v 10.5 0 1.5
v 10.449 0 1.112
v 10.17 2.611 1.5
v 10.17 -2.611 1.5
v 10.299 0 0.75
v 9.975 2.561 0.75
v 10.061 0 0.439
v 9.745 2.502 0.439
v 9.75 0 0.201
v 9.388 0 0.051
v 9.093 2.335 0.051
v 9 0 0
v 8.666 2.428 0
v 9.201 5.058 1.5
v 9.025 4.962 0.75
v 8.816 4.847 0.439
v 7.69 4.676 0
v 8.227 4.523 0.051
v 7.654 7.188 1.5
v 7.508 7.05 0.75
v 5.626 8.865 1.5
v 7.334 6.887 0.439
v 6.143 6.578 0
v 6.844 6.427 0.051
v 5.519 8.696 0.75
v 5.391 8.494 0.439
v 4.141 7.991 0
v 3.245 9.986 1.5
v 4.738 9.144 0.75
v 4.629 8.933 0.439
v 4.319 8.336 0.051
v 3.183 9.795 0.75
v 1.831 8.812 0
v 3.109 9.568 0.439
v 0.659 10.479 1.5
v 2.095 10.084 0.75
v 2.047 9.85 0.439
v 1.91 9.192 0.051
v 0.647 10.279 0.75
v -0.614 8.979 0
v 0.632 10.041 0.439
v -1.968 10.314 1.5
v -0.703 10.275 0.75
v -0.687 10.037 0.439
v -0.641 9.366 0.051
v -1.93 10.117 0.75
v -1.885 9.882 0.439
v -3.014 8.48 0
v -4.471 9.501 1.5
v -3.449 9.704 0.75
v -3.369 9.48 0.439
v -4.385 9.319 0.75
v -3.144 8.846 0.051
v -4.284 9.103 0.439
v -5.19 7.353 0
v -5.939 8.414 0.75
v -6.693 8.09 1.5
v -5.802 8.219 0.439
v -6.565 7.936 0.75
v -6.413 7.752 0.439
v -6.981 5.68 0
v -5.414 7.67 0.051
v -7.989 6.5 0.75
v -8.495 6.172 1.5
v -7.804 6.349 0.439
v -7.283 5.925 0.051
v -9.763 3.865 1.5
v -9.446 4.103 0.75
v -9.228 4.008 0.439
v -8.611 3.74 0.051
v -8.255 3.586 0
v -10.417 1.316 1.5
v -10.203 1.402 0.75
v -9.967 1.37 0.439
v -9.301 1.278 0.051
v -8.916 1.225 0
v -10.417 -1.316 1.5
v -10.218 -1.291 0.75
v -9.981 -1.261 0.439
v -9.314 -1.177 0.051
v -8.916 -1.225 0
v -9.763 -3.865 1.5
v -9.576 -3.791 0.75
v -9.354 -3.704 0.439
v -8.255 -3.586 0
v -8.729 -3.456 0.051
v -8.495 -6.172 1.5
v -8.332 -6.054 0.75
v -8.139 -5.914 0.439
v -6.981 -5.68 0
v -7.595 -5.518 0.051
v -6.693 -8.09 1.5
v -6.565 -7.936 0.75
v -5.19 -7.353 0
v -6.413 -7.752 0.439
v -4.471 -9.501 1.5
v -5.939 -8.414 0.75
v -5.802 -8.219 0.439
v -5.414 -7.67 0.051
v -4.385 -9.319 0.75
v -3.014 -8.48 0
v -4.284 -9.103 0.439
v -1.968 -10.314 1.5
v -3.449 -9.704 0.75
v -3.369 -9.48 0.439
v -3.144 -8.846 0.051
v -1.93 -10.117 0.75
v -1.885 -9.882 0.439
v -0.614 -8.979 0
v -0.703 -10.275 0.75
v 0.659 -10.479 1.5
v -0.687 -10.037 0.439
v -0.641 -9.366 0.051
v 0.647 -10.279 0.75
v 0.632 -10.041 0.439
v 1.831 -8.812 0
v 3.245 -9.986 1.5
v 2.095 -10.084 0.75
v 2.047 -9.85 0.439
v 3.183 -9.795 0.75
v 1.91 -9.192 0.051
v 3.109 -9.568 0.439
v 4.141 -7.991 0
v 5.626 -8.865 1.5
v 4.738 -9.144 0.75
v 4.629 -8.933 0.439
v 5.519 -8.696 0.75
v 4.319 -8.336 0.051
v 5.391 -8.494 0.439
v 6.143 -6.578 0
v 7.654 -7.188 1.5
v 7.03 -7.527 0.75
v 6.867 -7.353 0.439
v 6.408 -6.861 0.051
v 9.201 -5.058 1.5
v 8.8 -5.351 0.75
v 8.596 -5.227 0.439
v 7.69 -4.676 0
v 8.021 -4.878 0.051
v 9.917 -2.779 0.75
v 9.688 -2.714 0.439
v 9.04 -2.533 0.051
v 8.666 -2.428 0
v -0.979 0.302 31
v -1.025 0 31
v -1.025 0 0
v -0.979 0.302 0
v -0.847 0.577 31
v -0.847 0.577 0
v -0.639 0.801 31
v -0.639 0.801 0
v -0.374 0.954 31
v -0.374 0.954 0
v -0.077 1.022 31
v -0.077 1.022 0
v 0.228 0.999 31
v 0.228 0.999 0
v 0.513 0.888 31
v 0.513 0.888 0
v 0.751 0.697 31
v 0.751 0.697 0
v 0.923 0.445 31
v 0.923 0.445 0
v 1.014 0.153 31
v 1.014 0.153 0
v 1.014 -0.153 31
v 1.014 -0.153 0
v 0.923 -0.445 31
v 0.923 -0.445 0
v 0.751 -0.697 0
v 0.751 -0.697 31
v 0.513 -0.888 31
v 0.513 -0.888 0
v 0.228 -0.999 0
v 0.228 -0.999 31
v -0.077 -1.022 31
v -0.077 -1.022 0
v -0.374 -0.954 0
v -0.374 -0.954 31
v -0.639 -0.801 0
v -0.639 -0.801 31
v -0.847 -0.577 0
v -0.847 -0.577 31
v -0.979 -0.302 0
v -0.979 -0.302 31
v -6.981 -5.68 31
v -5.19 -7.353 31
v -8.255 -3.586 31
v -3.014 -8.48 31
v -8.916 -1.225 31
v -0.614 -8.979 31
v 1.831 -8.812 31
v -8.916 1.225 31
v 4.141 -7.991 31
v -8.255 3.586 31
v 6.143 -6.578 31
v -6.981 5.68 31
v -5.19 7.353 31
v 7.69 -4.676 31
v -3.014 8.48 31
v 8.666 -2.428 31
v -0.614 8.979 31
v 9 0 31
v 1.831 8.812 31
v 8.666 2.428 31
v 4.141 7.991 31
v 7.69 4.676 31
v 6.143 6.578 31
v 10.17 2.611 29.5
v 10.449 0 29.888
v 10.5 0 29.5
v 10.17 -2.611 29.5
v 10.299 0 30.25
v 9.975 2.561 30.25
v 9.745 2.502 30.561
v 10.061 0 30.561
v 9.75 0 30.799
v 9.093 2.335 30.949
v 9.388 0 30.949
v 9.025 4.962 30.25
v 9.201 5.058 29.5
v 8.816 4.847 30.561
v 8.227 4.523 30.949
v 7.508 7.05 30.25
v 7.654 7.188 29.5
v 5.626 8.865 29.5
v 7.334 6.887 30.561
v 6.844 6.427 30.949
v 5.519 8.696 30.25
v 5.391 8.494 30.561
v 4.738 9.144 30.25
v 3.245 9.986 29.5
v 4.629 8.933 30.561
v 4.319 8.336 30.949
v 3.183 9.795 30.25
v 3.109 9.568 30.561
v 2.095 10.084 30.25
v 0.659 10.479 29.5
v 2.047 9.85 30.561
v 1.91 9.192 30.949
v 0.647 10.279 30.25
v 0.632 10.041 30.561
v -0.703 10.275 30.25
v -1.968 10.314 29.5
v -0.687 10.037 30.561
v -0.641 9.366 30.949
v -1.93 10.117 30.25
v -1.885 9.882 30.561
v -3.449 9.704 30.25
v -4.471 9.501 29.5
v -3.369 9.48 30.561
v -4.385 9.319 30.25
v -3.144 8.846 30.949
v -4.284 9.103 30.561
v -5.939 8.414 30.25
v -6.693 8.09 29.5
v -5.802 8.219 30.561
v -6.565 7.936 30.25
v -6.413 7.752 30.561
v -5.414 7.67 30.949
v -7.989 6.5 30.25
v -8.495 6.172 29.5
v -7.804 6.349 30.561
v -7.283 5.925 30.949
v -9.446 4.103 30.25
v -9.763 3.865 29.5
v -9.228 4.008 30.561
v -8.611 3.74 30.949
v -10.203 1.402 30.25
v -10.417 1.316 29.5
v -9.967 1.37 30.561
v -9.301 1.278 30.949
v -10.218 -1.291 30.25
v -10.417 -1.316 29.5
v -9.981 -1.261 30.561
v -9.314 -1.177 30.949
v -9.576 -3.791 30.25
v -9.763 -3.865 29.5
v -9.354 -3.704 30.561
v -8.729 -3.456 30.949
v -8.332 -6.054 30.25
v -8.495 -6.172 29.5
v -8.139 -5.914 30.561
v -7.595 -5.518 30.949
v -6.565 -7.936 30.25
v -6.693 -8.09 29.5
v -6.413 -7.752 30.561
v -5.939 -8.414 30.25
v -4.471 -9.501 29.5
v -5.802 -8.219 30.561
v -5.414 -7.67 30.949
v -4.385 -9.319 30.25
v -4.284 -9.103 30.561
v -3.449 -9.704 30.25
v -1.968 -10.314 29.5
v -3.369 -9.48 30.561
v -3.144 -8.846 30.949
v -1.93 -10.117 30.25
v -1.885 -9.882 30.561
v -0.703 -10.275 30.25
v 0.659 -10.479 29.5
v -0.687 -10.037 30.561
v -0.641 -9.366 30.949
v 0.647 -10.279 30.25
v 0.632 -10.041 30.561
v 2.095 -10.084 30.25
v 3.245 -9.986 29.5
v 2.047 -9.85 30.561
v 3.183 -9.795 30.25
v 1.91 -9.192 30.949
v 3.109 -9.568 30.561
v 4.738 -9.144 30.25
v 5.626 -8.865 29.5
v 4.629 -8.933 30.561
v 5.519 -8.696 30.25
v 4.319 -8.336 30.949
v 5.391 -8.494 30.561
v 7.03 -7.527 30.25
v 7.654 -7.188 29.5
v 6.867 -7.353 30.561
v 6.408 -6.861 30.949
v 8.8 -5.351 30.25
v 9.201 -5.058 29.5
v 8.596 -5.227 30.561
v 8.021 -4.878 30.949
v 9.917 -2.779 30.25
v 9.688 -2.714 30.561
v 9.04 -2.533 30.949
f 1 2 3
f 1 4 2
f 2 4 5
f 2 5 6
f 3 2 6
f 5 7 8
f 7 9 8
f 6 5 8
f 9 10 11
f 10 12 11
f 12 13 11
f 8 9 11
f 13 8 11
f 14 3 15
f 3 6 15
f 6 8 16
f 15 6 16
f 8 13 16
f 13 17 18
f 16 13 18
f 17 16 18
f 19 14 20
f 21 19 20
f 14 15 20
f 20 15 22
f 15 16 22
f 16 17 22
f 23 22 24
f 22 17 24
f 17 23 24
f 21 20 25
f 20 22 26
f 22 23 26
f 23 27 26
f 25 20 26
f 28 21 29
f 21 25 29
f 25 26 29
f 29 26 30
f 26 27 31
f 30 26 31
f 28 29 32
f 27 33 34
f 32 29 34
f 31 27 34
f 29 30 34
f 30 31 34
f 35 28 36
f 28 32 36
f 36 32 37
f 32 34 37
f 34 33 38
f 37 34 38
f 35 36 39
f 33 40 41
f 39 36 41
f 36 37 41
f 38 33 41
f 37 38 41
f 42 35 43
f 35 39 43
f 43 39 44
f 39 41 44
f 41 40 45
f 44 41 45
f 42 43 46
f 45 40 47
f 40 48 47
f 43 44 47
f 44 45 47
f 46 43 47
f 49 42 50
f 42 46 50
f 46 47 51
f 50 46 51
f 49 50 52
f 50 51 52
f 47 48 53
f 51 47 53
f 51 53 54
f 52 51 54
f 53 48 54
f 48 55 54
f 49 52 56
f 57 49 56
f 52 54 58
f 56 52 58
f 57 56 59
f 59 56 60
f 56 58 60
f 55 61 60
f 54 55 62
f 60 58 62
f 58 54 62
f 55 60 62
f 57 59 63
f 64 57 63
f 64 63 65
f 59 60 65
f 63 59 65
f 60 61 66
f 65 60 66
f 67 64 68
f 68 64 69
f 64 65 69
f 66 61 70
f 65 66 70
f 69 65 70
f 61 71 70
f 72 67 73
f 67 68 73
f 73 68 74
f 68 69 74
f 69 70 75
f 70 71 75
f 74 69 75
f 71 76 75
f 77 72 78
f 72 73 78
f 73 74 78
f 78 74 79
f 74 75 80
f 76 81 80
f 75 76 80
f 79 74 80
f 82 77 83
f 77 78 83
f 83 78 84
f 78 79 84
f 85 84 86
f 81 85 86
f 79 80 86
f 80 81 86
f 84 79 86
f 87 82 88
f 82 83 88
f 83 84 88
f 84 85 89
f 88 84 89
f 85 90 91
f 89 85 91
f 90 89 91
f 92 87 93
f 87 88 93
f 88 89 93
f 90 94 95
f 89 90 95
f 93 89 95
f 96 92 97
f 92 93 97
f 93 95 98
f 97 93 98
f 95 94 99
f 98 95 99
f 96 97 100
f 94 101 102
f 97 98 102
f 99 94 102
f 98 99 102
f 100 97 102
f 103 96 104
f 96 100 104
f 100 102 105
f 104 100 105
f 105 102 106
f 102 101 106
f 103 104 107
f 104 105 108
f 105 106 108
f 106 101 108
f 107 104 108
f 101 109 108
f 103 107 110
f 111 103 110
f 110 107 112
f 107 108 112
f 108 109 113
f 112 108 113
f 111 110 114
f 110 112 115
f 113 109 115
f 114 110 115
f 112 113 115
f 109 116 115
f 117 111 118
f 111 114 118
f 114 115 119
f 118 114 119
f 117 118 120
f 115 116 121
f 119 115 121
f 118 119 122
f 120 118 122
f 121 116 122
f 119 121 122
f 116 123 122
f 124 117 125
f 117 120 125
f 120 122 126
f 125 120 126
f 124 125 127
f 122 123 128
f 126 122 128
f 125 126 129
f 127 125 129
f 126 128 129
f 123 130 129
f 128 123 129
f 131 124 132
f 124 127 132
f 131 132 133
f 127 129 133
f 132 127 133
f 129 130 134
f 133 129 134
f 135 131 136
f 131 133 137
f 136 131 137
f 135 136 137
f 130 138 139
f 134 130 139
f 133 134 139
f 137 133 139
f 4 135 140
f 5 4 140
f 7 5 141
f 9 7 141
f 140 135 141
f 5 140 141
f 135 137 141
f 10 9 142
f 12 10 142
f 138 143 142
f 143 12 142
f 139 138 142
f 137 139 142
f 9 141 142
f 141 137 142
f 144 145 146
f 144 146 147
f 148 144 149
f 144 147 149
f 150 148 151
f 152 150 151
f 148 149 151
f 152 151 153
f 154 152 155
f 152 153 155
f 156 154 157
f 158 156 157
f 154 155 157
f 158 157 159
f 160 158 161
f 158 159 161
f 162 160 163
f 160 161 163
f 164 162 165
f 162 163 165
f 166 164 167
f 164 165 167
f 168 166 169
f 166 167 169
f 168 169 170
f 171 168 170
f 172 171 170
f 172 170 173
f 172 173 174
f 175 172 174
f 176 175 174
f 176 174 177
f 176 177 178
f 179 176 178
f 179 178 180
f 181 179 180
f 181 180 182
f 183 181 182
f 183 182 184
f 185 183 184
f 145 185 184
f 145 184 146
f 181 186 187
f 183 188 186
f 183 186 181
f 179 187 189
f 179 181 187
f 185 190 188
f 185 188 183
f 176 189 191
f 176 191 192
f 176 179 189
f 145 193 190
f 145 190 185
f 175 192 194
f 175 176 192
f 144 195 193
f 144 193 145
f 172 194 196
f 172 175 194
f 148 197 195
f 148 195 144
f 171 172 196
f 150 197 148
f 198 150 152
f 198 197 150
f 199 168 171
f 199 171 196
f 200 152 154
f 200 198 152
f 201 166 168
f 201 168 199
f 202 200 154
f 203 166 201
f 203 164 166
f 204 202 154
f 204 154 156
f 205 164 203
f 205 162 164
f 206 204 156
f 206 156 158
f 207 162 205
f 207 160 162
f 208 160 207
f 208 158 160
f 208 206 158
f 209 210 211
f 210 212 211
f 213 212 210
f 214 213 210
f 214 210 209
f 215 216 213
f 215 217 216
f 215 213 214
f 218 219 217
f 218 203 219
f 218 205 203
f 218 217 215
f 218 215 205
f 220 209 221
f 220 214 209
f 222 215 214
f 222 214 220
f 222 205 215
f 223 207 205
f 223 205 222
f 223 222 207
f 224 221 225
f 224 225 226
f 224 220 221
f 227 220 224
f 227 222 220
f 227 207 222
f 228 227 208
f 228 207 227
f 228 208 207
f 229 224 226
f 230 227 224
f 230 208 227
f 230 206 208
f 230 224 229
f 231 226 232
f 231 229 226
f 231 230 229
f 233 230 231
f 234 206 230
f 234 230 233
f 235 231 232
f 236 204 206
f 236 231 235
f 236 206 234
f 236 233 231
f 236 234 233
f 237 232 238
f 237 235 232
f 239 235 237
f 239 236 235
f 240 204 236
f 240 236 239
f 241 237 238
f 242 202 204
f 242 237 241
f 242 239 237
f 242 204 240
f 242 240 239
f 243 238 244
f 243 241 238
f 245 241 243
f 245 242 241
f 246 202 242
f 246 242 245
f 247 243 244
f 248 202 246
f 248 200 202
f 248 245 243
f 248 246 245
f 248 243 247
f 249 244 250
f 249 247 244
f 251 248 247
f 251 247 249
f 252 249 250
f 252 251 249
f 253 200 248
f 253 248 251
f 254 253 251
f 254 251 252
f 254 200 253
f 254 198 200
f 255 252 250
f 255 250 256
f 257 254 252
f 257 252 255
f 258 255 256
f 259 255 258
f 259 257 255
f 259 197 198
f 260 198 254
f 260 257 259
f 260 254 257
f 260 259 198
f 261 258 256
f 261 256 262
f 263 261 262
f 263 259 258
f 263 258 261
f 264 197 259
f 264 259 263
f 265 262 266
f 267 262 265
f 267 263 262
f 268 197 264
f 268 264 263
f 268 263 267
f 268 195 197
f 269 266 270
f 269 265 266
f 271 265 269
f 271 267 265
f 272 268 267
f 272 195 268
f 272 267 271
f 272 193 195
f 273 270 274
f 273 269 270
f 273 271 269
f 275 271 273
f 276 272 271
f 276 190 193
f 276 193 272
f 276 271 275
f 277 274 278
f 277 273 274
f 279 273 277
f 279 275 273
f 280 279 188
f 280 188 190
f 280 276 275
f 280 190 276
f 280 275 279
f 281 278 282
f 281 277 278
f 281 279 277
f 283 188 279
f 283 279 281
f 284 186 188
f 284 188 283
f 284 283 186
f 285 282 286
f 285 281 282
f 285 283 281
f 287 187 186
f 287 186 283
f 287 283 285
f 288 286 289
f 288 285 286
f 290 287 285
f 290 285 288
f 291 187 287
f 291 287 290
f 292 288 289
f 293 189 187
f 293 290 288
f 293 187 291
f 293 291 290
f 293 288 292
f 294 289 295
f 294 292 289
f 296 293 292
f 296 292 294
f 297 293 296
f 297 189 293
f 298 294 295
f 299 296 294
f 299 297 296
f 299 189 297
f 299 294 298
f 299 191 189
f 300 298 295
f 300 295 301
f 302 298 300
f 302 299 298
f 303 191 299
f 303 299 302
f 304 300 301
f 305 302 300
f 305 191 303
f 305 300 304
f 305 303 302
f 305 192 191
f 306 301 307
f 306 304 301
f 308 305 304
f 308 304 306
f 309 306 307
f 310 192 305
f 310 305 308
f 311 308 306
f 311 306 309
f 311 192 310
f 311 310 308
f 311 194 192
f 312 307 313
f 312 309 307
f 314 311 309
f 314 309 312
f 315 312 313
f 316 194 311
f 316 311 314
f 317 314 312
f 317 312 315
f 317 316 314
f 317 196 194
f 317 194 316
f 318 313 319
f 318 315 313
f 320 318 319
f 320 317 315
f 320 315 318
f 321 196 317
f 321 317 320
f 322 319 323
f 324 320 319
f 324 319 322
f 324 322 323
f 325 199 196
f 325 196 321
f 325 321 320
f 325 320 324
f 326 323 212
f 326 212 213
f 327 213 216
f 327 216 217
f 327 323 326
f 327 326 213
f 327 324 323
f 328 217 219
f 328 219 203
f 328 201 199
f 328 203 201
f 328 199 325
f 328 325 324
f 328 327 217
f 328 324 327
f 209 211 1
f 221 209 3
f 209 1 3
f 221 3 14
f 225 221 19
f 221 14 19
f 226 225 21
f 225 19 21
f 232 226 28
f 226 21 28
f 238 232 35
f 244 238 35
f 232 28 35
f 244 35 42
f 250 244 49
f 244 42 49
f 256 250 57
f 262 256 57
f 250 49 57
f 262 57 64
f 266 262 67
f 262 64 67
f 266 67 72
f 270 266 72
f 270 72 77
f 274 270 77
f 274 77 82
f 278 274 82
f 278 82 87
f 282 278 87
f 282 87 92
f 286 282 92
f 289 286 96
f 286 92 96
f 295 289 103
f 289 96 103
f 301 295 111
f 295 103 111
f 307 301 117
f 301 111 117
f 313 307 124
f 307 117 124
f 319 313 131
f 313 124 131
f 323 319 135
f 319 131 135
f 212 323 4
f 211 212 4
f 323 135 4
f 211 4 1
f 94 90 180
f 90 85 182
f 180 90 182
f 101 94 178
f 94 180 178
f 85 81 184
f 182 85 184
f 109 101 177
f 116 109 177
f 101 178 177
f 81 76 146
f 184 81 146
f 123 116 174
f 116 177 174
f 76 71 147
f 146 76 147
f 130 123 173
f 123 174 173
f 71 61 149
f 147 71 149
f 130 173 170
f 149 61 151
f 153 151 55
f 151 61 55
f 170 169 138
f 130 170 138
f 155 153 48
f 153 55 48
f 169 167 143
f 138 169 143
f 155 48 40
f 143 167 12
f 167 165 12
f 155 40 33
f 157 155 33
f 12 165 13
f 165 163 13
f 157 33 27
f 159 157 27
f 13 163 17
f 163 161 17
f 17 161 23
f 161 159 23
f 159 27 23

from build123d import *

# Parameters (mm, degrees)
SKETCH1_R           = 10.5
BOSS_EXTRUDE1_DEPTH = 31
FILLET1_R           = 1.5
SKETCH2_R           = 1.025
CUT_EXTRUDE1_DEPTH  = 35


with BuildPart() as part:
    # Sketch1 → Boss-Extrude1 (new body)
    with BuildSketch(Plane.XY):
        Circle(SKETCH1_R)
    extrude(amount=BOSS_EXTRUDE1_DEPTH)

    # Fillet1
    fillet1_edges = [part.edges().sort_by_distance(p)[0] for p in [
        (-10.5, 0, 0),
        (-10.5, 0, 31),
    ]]
    fillet(fillet1_edges, radius=FILLET1_R)

    # Sketch2 → Cut-Extrude1 (cut)
    with BuildSketch(Plane(origin=(0, 0, 0), x_dir=(-1, 0, 0), z_dir=(0, 0, -1))):
        Circle(SKETCH2_R)
    extrude(amount=-CUT_EXTRUDE1_DEPTH, mode=Mode.SUBTRACT)


solid = part.part
